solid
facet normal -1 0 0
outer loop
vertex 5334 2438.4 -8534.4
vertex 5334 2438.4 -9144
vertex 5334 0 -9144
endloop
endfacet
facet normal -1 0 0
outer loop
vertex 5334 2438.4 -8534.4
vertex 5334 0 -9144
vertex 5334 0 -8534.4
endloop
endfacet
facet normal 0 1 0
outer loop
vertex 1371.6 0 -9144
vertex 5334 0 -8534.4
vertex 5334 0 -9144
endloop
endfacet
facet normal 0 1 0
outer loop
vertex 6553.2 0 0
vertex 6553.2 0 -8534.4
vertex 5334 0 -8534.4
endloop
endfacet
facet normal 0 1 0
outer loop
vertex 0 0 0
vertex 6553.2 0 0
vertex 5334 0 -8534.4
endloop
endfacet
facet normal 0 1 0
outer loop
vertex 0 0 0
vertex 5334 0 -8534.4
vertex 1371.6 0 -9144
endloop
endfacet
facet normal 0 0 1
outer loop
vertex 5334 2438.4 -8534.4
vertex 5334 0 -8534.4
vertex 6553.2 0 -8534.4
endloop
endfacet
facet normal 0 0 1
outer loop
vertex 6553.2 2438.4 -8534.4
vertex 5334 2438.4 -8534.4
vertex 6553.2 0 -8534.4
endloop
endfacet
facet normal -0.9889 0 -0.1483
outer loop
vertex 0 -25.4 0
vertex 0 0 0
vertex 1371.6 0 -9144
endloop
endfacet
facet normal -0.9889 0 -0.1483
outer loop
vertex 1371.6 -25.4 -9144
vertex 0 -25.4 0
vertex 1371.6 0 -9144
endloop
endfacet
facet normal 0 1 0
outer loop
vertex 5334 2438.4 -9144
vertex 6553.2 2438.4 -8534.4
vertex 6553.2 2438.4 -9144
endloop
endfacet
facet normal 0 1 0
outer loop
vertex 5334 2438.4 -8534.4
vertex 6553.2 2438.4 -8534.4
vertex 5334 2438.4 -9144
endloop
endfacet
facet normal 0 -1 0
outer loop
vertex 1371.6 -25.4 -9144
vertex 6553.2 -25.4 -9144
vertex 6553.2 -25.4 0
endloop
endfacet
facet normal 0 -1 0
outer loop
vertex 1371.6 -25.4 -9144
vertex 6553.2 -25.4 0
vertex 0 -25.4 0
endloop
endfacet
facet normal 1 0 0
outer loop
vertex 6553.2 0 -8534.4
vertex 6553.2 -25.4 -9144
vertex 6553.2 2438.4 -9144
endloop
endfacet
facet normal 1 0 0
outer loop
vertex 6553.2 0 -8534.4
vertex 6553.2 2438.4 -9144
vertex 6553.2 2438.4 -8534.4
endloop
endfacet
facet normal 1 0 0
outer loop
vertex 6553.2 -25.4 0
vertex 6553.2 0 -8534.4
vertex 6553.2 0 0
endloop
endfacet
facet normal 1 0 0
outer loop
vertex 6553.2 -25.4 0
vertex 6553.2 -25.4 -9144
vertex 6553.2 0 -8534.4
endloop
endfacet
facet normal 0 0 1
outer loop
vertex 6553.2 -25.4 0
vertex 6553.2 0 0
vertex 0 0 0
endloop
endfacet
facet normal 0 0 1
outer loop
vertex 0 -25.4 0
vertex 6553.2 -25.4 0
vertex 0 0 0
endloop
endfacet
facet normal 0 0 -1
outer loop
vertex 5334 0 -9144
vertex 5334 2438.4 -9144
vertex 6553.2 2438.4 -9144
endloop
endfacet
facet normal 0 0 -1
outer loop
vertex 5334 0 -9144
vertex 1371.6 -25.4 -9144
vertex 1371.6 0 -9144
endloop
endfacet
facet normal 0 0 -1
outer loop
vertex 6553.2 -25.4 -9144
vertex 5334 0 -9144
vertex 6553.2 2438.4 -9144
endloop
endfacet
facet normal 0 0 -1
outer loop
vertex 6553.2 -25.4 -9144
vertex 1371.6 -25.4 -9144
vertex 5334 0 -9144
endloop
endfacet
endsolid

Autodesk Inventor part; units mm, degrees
ref_plane "YZ Plane" through (0, 0, 0) normal (1, 0, 0) x (0, 1, 0)
ref_plane "XZ Plane" through (0, 0, 0) normal (0, 1, 0) x (-1, 0, 0)
ref_plane "XY Plane" through (0, 0, 0) normal (0, 0, 1) x (1, 0, 0)
sketch "Sketch1" plane through (0, 0, 0) normal (0, 1, 0) x (-1, 0, 0)
  line L0 (0, 0) -> (-1371.6, -9144)
  line L1 (-1371.6, -9144) -> (-6553.2, -9144)
  line L2 (-6553.2, -9144) -> (-6553.2, 0)
  line L3 (-6553.2, 0) -> (-1371.6, 0)
  line L4 (-1371.6, 0) -> (0, 0)
  line L5 (-1371.6, 0) -> (-1371.6, -9144) construction
  line L6 (-6553.2, -9144) -> (-5334, -9144)
  line L7 (-5334, -9144) -> (-5334, -8534.4)
  line L8 (-5334, -8534.4) -> (-6553.2, -8534.4)
  line L9 (-6553.2, -8534.4) -> (-6553.2, -9144)
  dimension "d4" = 1371.6
  dimension "d5" = 9144
  dimension "d6" = 5181.6
  dimension "d7" = 1219.2
  dimension "d8" = 609.6
extrude "Extrusion1" add sketch "Sketch1" against normal blind 25.4
extrude "Extrusion2" add sketch "Sketch1" along normal blind 2438.4 contours L1 L2 L8 L7
equation "\"pillar\" = pillarHeight"
equation "\"pillarHeight\" = 2438.4"
properties part number "Building"
